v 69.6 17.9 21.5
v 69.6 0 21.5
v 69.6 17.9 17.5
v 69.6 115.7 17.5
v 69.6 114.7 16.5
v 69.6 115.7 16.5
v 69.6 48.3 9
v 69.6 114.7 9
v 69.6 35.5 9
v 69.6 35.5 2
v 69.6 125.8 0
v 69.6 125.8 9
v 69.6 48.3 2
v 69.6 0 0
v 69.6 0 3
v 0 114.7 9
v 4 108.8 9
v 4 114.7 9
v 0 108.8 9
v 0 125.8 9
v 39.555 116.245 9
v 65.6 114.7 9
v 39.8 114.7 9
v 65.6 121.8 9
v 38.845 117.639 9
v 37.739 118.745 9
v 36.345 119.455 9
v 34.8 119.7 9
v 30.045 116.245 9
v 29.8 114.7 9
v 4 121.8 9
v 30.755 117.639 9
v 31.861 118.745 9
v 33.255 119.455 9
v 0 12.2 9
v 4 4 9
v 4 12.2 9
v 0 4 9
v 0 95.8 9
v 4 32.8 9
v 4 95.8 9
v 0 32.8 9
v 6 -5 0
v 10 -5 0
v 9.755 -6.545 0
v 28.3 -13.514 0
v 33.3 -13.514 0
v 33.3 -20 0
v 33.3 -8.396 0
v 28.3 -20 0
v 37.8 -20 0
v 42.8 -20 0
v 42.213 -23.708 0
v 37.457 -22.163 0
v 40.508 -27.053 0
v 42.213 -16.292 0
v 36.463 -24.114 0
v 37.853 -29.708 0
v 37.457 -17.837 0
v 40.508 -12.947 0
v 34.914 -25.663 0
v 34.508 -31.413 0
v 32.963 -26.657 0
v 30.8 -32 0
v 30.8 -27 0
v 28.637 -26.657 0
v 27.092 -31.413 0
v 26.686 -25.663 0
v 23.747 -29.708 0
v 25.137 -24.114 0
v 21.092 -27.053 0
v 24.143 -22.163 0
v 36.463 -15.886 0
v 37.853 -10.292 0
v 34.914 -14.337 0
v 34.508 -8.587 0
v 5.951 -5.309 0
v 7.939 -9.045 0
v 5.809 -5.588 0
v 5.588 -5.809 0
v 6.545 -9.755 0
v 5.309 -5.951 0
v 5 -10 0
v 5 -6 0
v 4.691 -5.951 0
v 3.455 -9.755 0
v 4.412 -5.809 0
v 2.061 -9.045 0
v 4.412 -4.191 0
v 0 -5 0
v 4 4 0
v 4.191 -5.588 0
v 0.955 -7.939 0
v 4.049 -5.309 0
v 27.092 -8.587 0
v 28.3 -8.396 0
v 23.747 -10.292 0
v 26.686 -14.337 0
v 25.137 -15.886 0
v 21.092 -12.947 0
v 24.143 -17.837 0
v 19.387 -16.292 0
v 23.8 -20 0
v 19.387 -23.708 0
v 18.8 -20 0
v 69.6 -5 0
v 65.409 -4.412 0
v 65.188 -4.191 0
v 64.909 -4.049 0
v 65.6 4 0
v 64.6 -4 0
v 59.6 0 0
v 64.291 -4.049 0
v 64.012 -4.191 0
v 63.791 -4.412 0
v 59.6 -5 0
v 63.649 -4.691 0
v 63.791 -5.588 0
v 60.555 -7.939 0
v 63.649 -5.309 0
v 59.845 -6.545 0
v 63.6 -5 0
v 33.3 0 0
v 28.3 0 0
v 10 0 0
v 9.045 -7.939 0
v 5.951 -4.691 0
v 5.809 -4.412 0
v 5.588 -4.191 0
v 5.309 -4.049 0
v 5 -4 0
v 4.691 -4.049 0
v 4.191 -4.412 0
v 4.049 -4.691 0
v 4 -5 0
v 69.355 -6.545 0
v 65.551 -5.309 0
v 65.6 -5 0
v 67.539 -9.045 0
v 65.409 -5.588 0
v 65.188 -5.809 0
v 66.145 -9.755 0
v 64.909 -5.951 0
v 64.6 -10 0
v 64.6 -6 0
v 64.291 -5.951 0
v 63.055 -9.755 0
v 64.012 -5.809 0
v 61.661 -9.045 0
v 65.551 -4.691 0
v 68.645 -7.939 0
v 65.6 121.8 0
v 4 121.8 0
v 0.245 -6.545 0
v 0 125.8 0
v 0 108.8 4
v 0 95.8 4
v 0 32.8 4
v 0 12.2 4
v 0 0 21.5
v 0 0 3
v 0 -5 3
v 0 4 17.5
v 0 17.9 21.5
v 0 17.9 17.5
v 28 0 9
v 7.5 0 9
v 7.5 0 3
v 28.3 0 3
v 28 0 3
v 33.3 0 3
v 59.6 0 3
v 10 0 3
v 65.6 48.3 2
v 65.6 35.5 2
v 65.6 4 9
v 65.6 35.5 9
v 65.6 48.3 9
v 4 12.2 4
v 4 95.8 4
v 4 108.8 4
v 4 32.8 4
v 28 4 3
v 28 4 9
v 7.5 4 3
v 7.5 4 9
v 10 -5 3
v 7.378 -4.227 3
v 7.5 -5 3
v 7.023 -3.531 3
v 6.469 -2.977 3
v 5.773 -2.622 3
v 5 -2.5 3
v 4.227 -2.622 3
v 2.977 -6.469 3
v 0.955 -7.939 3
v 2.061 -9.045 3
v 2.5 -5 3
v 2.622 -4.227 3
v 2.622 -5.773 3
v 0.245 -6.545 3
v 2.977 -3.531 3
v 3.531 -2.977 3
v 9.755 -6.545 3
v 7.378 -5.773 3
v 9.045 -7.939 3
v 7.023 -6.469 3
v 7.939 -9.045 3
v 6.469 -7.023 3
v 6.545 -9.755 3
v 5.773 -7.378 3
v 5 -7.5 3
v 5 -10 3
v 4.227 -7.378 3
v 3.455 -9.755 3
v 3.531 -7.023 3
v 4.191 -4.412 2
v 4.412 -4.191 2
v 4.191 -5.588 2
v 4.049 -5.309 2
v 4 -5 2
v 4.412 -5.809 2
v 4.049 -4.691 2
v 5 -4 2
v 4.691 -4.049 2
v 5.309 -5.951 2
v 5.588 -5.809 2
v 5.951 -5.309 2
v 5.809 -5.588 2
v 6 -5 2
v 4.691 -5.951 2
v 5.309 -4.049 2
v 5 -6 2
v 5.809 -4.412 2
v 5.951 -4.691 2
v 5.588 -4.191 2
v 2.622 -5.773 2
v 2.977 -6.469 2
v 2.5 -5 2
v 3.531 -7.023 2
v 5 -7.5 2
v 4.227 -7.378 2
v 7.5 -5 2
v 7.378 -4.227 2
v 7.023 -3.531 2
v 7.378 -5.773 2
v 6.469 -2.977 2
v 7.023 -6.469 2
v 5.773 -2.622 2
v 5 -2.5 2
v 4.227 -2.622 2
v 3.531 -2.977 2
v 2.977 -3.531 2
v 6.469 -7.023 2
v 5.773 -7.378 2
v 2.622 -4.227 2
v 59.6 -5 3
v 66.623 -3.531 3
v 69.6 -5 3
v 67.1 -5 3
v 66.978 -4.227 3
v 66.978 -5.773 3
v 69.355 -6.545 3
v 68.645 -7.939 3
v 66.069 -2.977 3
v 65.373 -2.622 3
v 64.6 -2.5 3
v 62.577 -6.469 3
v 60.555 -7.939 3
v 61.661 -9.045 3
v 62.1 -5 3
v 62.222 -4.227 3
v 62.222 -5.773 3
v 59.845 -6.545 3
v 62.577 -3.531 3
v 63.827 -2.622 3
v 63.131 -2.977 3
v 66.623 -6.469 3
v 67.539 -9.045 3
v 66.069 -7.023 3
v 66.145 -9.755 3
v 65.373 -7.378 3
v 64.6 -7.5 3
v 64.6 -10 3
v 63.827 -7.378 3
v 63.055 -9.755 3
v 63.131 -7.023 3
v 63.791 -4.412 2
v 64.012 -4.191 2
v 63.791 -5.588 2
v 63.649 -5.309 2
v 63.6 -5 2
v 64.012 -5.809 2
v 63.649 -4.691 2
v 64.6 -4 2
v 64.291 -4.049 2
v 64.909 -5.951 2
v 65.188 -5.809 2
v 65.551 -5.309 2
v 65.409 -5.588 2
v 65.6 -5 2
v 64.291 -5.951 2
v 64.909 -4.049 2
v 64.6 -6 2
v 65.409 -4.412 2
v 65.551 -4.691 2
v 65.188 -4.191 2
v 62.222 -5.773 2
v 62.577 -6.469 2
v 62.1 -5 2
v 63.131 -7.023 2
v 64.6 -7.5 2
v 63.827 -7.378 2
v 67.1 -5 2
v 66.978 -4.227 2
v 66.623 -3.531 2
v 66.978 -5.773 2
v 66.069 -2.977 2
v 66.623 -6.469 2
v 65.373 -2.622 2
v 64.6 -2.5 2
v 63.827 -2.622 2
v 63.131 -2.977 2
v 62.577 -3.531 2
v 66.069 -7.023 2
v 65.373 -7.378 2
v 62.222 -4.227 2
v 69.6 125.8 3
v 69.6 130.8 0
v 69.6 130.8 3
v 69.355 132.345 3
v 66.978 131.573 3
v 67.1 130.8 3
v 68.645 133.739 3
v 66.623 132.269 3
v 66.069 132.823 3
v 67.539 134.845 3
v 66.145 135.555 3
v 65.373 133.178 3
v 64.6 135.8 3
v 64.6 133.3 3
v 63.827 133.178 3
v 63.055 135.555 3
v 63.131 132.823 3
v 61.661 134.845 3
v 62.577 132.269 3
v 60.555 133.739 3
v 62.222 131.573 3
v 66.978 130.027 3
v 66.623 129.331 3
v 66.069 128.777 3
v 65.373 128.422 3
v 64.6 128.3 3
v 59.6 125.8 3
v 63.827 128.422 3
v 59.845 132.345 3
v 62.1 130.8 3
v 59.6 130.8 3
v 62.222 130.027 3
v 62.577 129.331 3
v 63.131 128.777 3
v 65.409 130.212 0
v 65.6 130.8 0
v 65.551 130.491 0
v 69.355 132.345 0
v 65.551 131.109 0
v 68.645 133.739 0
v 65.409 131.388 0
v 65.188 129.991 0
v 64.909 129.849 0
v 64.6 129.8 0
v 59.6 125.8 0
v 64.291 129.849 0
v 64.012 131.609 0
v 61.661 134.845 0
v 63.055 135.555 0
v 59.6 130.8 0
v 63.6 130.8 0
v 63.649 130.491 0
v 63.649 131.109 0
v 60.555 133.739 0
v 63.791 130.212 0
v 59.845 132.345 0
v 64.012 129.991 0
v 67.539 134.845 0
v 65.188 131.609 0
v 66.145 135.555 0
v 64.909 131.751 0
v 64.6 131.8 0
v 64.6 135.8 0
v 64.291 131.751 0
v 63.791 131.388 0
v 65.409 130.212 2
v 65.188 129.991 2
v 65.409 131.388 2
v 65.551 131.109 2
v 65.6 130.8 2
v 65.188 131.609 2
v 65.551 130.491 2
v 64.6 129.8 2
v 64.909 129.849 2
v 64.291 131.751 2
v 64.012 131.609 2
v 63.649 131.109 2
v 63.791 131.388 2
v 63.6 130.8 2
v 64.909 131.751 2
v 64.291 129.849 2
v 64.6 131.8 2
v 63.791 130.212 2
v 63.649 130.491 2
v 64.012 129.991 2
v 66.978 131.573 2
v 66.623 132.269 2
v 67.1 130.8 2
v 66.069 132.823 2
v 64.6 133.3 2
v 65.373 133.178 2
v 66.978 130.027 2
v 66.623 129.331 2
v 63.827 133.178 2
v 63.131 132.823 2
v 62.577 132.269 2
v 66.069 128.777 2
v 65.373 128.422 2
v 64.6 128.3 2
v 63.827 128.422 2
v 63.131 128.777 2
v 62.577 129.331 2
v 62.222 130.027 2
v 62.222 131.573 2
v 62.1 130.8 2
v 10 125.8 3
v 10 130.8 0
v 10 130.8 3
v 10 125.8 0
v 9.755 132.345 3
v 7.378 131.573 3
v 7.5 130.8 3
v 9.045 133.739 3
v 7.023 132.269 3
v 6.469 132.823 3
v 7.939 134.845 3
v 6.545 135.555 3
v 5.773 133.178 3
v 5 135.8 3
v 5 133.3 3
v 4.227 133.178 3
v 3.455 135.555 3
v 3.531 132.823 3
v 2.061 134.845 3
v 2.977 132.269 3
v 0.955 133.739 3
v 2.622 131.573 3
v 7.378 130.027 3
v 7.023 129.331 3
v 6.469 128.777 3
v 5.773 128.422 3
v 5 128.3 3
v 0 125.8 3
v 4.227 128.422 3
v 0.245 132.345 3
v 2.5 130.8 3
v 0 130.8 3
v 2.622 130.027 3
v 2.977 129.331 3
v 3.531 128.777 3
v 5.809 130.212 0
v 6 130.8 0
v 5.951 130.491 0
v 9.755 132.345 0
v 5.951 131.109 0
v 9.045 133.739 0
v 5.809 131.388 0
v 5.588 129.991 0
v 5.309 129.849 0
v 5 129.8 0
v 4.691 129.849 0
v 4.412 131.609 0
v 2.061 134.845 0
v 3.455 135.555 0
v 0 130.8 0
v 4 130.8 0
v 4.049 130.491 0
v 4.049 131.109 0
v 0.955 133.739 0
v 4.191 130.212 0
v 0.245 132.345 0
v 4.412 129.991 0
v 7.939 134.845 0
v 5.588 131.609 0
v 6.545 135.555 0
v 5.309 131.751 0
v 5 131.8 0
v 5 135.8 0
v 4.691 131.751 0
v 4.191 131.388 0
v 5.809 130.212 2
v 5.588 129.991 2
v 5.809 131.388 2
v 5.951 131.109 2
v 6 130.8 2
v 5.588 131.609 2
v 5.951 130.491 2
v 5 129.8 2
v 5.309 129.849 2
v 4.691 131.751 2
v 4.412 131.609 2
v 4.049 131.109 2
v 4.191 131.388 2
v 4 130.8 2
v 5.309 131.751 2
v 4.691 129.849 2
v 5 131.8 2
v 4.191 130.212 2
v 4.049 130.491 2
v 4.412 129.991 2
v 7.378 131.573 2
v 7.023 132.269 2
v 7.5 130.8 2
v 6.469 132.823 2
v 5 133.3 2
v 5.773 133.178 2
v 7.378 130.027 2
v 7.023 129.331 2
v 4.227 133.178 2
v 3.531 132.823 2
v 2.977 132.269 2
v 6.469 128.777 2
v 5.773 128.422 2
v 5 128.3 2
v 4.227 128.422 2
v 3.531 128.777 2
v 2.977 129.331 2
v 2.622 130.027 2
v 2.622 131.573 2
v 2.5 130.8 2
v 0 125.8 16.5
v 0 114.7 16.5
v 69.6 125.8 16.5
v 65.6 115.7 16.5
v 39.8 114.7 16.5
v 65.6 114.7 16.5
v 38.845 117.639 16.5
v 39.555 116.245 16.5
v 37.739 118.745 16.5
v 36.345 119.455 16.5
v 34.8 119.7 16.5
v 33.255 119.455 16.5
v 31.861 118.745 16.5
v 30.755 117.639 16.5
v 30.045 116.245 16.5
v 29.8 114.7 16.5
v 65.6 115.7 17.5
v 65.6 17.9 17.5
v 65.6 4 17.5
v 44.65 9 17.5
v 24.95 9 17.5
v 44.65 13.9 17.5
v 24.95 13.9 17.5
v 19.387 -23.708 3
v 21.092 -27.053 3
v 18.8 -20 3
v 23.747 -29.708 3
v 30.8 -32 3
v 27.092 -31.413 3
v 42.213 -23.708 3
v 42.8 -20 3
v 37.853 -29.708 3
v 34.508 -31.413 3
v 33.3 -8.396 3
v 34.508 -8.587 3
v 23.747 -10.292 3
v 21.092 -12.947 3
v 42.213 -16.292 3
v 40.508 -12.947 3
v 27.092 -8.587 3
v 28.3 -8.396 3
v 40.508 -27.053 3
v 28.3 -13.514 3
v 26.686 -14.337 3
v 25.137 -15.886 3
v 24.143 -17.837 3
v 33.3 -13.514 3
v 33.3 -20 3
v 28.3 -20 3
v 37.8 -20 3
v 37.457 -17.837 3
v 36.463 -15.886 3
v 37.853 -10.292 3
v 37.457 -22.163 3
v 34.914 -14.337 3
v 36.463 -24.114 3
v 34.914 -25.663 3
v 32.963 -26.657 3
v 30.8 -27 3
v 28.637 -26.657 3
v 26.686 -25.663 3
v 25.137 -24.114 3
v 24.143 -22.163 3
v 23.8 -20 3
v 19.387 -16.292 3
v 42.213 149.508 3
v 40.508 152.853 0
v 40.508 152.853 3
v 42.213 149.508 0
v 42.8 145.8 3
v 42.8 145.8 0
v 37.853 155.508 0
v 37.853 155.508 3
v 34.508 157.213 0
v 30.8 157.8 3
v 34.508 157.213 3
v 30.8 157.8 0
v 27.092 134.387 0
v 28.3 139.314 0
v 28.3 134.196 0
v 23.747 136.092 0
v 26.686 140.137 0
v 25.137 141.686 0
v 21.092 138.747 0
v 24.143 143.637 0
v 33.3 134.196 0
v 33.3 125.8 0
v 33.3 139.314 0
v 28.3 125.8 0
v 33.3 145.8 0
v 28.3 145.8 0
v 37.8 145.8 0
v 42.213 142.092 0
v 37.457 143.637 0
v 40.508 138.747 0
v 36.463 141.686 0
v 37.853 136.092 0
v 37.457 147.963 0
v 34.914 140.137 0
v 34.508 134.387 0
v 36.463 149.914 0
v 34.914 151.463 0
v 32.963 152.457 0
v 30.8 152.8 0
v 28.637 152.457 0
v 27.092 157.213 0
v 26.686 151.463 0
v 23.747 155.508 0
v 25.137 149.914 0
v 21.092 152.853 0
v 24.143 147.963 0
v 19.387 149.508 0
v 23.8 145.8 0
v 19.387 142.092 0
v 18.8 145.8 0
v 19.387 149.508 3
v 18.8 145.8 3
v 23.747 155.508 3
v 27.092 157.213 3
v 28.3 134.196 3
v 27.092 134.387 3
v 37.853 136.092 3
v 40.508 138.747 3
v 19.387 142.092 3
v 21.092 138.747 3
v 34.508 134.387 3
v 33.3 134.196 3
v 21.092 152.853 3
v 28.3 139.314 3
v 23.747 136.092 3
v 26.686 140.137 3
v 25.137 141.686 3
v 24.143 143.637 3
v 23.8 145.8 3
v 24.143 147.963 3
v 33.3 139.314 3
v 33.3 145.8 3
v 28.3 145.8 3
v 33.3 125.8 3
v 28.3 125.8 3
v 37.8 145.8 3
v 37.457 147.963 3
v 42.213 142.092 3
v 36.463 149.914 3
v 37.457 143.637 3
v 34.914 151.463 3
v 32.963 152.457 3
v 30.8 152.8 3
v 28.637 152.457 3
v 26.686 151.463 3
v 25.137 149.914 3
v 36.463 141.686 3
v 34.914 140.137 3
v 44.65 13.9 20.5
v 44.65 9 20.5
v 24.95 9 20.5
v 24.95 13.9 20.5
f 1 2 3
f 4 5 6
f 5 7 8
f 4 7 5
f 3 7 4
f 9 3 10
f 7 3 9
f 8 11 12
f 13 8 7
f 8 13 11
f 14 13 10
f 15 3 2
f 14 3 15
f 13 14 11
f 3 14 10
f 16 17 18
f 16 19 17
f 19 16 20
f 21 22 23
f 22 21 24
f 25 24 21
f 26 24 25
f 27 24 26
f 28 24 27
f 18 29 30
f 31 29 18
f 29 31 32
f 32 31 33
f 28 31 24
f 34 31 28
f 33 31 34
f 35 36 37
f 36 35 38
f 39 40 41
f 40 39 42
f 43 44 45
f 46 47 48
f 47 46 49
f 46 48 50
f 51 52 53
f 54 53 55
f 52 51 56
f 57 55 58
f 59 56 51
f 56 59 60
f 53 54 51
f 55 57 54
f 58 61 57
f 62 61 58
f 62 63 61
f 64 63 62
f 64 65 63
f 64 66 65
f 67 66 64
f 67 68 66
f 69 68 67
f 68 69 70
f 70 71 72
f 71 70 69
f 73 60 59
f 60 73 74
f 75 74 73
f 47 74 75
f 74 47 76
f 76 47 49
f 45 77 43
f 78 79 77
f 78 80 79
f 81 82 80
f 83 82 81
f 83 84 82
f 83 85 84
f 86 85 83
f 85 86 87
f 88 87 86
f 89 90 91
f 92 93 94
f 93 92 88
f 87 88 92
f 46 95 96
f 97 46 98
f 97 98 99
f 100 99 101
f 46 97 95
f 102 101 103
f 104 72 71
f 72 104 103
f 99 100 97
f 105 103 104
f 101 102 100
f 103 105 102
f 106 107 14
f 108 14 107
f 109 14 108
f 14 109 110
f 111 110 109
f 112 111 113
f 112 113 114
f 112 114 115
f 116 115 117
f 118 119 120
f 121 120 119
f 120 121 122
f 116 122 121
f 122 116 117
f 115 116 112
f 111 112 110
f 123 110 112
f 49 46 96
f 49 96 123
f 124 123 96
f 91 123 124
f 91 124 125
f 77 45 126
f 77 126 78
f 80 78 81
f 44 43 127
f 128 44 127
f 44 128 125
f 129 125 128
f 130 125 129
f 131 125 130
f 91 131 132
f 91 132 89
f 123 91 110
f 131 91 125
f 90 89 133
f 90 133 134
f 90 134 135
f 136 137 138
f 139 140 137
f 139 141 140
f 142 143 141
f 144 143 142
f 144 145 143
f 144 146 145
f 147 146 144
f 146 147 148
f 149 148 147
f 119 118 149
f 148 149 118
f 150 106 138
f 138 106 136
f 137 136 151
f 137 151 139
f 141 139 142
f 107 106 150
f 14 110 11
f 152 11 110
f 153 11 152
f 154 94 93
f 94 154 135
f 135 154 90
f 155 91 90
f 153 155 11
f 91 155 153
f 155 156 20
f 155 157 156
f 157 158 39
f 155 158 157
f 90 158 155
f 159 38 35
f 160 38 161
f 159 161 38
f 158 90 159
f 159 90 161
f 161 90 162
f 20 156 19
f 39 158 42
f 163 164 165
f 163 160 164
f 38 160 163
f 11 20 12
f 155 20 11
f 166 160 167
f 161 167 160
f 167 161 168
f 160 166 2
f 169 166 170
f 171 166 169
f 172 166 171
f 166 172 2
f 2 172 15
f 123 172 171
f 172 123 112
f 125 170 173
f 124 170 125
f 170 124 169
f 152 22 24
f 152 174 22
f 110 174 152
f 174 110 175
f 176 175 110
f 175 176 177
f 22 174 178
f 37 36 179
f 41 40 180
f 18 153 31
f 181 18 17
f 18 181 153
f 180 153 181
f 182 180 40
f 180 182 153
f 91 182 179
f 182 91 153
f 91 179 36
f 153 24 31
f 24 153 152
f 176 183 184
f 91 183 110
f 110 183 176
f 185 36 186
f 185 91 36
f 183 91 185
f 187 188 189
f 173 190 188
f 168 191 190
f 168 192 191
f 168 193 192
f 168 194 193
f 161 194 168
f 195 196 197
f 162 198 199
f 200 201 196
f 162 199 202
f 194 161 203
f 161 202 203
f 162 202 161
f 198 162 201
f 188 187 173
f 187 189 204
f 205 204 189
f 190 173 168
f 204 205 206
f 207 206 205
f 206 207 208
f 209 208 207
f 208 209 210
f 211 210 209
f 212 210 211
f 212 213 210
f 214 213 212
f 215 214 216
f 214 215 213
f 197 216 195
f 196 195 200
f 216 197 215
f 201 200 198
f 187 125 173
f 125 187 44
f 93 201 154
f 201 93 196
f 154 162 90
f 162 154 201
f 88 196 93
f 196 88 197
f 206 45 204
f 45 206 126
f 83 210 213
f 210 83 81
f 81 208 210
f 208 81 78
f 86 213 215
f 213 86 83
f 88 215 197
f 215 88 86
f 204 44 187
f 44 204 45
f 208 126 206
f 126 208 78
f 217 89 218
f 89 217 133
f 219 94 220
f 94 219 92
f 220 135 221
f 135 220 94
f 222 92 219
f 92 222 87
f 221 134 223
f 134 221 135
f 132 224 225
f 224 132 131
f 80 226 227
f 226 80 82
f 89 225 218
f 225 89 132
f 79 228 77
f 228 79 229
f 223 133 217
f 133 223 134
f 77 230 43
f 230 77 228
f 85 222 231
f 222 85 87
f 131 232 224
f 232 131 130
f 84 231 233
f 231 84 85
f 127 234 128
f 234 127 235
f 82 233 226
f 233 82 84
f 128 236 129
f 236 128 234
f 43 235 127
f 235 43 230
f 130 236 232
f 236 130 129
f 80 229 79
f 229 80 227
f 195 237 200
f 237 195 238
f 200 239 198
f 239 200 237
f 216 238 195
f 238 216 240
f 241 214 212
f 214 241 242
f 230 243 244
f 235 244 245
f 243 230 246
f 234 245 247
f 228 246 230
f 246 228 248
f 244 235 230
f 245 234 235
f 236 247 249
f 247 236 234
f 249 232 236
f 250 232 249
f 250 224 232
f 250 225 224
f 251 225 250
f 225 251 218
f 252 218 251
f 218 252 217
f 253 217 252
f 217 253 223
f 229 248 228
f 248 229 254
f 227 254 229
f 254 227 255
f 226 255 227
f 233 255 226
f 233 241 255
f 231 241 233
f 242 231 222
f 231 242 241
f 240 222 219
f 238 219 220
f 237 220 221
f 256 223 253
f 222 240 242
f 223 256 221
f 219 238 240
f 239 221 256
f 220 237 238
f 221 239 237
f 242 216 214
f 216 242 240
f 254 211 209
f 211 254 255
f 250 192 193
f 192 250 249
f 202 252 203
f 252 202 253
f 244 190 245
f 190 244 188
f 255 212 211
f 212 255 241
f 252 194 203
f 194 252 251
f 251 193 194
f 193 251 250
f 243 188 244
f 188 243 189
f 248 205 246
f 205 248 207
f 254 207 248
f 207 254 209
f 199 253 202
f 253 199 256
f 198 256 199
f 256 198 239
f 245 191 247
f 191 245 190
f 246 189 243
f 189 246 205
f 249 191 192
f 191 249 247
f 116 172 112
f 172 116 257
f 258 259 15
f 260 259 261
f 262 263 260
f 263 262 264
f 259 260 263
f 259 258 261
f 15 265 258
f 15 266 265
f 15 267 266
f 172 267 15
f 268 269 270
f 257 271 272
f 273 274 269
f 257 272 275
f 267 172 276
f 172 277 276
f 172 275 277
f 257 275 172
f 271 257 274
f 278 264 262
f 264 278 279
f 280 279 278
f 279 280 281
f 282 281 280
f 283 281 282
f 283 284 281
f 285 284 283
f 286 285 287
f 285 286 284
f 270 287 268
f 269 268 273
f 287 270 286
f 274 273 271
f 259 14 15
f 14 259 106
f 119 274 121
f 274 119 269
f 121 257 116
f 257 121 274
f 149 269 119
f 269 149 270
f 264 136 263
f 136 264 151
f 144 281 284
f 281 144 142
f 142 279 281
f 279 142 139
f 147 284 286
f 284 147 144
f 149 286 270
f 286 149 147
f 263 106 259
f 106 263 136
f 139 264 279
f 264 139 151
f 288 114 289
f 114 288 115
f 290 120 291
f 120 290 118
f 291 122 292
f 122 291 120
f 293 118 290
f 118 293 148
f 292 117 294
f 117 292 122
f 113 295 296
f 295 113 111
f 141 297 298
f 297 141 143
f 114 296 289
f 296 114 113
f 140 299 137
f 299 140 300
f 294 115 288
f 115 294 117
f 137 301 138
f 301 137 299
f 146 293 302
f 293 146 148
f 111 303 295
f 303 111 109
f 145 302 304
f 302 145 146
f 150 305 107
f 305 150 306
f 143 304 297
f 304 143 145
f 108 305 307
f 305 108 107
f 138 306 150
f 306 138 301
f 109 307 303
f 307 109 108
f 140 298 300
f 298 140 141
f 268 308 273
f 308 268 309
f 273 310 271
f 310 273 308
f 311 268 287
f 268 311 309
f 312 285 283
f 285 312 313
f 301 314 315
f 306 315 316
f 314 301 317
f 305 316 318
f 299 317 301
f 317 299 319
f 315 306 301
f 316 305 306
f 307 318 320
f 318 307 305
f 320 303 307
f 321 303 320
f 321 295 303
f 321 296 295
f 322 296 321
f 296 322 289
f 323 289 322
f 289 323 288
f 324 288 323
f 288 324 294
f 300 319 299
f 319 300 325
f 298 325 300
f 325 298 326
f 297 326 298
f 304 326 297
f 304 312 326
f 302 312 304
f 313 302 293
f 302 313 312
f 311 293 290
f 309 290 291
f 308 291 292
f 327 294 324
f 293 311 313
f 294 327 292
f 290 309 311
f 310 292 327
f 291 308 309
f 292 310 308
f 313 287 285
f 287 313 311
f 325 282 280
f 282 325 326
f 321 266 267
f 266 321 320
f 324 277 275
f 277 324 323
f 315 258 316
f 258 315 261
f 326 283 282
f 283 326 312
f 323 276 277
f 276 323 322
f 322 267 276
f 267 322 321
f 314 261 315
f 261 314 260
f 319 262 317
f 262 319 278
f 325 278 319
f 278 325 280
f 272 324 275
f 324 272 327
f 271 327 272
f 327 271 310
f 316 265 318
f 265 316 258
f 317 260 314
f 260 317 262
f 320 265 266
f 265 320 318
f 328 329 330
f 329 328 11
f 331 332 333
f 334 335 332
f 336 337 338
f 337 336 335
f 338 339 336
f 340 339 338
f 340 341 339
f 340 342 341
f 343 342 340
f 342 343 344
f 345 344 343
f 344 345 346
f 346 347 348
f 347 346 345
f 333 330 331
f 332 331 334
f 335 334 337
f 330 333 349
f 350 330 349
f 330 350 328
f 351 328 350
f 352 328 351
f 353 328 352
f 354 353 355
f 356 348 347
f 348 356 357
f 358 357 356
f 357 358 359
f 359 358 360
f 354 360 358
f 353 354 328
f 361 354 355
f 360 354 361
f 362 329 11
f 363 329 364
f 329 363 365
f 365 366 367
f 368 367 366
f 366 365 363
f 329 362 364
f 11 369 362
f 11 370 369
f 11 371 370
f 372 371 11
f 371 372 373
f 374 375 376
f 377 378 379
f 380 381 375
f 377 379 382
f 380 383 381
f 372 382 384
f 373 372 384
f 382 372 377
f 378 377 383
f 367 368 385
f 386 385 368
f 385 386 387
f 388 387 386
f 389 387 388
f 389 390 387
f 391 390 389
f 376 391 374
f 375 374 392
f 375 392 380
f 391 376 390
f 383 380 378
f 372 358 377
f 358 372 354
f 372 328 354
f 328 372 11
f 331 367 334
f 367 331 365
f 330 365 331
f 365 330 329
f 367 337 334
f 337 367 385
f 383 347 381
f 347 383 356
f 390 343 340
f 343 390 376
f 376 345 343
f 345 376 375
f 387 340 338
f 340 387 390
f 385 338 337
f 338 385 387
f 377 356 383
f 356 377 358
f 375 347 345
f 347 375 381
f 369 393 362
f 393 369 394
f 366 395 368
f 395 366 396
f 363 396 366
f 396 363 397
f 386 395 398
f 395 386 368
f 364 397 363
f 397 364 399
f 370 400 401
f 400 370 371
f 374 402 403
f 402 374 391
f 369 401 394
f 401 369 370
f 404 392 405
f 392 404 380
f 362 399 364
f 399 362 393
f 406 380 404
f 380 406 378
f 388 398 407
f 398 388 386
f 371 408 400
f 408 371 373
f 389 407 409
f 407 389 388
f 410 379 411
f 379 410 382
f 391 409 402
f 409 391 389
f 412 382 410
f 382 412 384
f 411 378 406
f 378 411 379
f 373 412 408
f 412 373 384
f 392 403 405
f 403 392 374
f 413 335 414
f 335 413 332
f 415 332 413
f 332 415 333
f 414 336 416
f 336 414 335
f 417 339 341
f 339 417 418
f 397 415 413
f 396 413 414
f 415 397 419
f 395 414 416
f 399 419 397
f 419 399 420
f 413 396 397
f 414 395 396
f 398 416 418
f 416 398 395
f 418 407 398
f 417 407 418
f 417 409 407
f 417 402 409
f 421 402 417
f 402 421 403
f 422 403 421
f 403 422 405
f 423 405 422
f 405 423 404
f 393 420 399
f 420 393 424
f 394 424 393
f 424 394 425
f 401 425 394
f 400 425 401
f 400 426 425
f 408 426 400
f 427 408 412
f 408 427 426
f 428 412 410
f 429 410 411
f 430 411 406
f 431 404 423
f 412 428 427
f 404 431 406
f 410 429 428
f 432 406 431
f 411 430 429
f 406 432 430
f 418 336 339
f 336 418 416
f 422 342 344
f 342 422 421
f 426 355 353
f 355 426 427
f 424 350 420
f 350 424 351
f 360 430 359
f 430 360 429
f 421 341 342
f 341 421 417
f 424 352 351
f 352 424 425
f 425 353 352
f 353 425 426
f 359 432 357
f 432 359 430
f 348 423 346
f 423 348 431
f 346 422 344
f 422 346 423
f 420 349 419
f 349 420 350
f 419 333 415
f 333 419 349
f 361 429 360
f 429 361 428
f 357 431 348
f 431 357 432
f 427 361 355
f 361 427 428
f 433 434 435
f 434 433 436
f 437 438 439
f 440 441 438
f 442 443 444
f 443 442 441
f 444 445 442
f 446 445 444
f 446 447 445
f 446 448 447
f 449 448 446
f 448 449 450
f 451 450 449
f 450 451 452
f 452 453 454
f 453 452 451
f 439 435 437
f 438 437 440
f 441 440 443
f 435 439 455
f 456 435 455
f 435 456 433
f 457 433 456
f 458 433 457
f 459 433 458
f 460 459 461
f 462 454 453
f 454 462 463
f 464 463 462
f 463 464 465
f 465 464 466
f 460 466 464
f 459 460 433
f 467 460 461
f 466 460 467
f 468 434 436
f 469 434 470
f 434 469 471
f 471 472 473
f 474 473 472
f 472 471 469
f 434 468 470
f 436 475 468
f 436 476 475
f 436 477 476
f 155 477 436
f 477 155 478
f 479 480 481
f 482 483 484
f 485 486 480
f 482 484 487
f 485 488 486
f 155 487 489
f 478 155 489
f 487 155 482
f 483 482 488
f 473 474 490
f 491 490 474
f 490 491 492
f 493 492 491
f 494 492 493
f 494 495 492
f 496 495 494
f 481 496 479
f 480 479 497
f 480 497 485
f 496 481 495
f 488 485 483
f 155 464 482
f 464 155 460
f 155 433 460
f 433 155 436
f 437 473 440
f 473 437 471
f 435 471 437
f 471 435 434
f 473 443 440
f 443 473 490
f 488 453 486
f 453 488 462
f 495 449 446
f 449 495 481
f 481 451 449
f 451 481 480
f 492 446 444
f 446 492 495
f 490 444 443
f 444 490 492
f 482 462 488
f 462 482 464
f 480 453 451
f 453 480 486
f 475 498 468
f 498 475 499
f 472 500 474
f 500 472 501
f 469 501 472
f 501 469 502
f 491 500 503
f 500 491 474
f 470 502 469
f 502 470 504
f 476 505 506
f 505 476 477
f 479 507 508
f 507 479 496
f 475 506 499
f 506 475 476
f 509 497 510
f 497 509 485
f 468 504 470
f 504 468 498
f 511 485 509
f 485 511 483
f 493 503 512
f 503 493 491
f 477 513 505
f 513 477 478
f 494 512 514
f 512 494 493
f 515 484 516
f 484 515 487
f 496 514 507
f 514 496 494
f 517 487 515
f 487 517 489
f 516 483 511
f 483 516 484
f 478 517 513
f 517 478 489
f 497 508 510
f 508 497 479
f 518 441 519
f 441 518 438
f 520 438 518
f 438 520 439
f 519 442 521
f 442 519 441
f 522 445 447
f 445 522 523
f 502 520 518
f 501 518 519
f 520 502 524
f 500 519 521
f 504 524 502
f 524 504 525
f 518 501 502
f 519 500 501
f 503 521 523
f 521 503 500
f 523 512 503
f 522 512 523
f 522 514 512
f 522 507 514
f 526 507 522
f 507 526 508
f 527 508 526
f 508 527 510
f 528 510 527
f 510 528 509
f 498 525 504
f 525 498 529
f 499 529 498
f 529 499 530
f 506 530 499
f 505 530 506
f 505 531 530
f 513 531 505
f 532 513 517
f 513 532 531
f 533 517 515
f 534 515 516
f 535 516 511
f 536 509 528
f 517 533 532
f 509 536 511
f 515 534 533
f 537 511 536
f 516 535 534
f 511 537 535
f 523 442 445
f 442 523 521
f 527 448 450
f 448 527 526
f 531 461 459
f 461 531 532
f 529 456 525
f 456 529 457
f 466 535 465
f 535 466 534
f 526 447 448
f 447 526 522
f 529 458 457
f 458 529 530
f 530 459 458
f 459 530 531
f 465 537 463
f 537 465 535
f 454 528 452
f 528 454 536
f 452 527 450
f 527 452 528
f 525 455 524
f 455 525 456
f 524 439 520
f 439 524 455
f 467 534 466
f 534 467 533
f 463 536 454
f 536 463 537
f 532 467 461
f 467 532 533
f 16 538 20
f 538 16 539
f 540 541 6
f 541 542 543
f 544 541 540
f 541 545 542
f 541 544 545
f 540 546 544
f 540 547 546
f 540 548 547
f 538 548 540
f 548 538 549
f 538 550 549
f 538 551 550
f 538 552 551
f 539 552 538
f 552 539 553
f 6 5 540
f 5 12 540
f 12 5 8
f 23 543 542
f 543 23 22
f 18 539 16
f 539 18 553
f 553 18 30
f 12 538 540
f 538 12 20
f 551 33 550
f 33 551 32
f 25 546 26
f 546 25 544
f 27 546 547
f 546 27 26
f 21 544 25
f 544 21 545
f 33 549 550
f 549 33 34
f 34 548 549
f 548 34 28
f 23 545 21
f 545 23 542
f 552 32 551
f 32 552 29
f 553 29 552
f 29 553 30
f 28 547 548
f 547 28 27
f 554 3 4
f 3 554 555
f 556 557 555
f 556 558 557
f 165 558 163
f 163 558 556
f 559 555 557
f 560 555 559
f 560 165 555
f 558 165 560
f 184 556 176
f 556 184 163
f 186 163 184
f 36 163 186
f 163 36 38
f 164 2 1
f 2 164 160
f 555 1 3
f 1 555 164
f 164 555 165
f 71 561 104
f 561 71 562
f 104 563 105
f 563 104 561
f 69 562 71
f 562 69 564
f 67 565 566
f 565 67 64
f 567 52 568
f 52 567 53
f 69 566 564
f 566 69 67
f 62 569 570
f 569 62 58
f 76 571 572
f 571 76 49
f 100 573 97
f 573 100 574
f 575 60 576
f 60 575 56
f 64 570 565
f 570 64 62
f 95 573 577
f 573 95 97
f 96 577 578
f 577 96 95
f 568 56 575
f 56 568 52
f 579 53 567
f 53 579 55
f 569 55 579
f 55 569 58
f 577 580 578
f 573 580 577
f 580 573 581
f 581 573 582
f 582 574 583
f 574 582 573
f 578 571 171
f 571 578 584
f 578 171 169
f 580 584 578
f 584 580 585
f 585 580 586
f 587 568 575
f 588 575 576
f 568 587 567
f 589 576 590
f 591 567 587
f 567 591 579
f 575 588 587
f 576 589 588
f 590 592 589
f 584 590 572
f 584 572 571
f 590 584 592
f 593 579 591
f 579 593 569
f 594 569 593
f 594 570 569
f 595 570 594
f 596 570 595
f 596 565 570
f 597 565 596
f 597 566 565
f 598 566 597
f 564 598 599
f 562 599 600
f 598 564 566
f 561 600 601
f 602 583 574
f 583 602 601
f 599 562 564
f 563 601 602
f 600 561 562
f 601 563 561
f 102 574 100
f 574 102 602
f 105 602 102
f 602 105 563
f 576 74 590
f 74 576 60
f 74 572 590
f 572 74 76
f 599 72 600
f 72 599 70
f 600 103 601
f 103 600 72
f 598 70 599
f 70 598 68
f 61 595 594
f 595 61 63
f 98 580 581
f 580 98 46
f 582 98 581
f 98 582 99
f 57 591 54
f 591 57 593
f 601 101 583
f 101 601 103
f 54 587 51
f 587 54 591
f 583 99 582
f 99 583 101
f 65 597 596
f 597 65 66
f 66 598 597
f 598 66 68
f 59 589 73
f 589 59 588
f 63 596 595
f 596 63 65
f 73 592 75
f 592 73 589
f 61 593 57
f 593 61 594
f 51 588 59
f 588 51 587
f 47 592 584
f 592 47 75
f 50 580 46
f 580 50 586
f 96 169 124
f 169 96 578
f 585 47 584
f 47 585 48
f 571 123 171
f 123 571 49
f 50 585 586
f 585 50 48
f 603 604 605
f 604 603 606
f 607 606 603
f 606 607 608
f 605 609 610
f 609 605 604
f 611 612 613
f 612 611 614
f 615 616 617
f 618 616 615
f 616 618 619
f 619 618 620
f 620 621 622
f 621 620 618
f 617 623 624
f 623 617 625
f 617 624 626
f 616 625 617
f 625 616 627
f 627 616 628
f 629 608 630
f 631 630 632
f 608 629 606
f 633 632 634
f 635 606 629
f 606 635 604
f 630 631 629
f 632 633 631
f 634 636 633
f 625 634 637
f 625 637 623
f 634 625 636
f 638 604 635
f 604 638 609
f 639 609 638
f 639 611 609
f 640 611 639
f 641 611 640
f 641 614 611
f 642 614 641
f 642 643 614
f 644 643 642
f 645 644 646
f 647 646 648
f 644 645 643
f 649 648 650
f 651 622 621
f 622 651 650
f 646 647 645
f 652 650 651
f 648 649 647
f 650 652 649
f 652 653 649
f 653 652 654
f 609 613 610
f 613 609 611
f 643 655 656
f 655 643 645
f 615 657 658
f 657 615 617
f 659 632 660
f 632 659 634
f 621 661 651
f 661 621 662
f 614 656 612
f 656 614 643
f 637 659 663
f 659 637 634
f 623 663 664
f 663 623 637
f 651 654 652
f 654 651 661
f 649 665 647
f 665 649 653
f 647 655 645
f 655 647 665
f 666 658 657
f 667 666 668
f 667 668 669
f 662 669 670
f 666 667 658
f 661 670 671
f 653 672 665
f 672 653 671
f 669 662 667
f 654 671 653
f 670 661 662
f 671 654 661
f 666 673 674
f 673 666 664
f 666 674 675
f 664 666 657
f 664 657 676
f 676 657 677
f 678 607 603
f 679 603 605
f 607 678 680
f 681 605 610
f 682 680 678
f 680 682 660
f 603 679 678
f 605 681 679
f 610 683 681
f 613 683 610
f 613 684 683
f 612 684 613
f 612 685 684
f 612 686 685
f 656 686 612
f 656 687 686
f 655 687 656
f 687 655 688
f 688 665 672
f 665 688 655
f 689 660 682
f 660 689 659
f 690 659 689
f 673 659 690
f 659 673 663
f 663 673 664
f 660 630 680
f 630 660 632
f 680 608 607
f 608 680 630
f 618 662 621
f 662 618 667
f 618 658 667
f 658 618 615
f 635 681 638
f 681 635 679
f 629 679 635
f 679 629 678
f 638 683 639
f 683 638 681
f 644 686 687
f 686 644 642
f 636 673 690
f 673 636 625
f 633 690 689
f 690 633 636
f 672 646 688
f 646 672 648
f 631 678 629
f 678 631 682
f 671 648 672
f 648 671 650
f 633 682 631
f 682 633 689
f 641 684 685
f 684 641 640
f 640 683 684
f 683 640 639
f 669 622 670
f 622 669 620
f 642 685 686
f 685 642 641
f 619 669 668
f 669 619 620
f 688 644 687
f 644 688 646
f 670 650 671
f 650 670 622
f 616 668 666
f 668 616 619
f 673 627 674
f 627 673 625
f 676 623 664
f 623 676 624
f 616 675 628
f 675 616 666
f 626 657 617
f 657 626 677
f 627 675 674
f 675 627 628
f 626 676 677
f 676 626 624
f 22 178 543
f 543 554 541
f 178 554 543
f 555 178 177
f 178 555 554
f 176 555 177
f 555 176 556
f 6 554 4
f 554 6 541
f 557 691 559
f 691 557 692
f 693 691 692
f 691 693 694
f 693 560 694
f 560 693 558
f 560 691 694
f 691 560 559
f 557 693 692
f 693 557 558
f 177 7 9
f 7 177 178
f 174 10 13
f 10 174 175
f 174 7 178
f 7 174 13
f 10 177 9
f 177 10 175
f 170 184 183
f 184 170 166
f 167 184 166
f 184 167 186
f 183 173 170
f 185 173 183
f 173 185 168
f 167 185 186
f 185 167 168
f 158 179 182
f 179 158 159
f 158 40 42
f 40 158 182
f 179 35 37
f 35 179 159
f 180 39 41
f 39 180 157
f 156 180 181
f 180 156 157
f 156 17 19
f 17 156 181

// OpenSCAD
// file: params.scad
$fn = 20;

very_long = 500;
short_length = 1;
free_space = 1;

// phone
phone_width = 59.6 + free_space * 2;
phone_height = 115.8 + free_space * 2;
phone_bottom_thickness = 9.0;
phone_total_thickness = 14.5 + free_space * 2;
phone_top_thickness = phone_total_thickness - phone_bottom_thickness + free_space;
phone_speaker_width = 19.7;
phone_speaker_to_edge = 9.0;
phone_screen_bottom_to_edge = 7.1;
phone_screen_top_to_edge = 13.9;
phone_left_top_to_edge = 5.6;
phone_right_top_to_edge = 6.6;
phone_screen_length = phone_height - phone_screen_bottom_to_edge + free_space;
phone_usb_to_top = 31.5;
phone_usb_to_back = 2;
phone_usb_width = 12.8;
phone_usb_height = phone_bottom_thickness - phone_usb_to_back;
phone_mic_radius = 5;
phone_power_to_right = 3.5;
phone_power_width = 20.5;
phone_volume_button_to_bottom = 4;
phone_volume_button_to_edge = 12.2;
phone_volume_button_width = 20.6;
phone_camera_button_to_bottom = phone_volume_button_to_bottom;
phone_camera_button_to_edge = 17;
phone_camera_button_width = 13;
phone_camera_center_to_left = 10.4;
phone_camera_center_to_top = 16.8;
phone_camera_radius = 5.3;

// connector
connector_thickness = 3.0;
connector_radius = 5.0;

// shield
shield_common_thickness = 4.0;
shield_bottom_inner_edge = 12;

// screw
screw_diameter = 2.0;
screw_depth = 2.0;
screw_cap_diameter = 5.0;

// belt
belt_connector_width = 8;
belt_connector_length = 30;
belt_connector_thickness = 5;
belt_hole_length = 20;
belt_hole_thickness = 2.5;
belt_connector_from_edge = 5;
belt_round_radius = 1.5;
// file: common.scad
include <params.scad>;

module connector(){
	difference(){
		union(){
			translate([-connector_radius, 0, 0]){
				cube([connector_radius * 2, connector_radius, connector_thickness]);
			};
			translate([0, connector_radius, 0]){
				cylinder(connector_thickness, connector_radius, connector_radius);
			}
		};
		translate([0, connector_radius, 0])union(){
			cylinder(connector_thickness, screw_diameter / 2, screw_diameter / 2);
			translate([0, 0, screw_depth]){
				cylinder(connector_thickness - screw_depth, screw_cap_diameter / 2, screw_cap_diameter / 2);
			}
		};
	}
}

module connector2(width){
	for(t = [
		[connector_radius, 0, 0],
		[width - connector_radius, 0, 0]
	]){
		translate(t)
			rotate([0, 0, 180])
				connector();
	}
}

module connector4(width, height){
	connector2(width);
	translate([width, height, 0])
		rotate([0, 0, 180])
			connector2(width);
}

module put_rotated_2(){
	for(i = [0:$children-1])
		child(i);
	rotate([0, 0, 180])
		for(i = [0:$children-1])
			child(i);
}

module drop(width, height, depth){
	translate([width / 2, height / 2, 0])
		rotate([180, 180, 180])
			cube([width, height, depth]);
}

module pile(ratio=1){
	stick_length = 20 * ratio;
	ring_radius = 12 * ratio;
	ring_width = 5 * ratio;
	stick_width = 5 * ratio;
	thickness = 3;
	union(){
		translate([-stick_width/2, 0, 0])
			cube([stick_width, stick_length, thickness]);
		translate([0, stick_length, 0])
			difference(){
				cylinder(thickness, ring_radius, ring_radius);
				cylinder(thickness, ring_radius - ring_width, ring_radius - ring_width);
			}
	}
}
// main file
include <common.scad>;

upper_part_width = phone_width + shield_common_thickness * 2;
upper_part_height = phone_height + shield_common_thickness * 2;

difference(){
	union(){
		difference(){
			cube([upper_part_width, upper_part_height, phone_bottom_thickness]);
			translate([shield_common_thickness, shield_common_thickness, 0])
				cube([phone_width, phone_height, phone_bottom_thickness]);
		}
		connector4(upper_part_width, upper_part_height);

		translate([upper_part_width, upper_part_height, phone_bottom_thickness])
			rotate([0, 0, 180])
				difference(){
					cube([upper_part_width, shield_common_thickness + phone_screen_bottom_to_edge, max(shield_common_thickness, phone_total_thickness - phone_bottom_thickness)]);
					translate([upper_part_width / 2, shield_common_thickness + phone_screen_bottom_to_edge, 0]){
						cylinder(very_long, phone_mic_radius, phone_mic_radius);
					}
				}

		translate([0, 0, phone_bottom_thickness]){
			cube([upper_part_width, shield_common_thickness, phone_top_thickness]);
			translate([0, 0, phone_top_thickness])
				cube([upper_part_width, shield_common_thickness + phone_screen_top_to_edge, shield_common_thickness]);
		}

		translate([upper_part_width, 0, phone_bottom_thickness])
			rotate([0, 0, 90])
				cube([shield_common_thickness + phone_screen_length, shield_common_thickness, phone_top_thickness]);
		translate([phone_width / 2, 0, 0])
			rotate([0, 0, 180])
				pile();
		translate([phone_width / 2, phone_height + shield_common_thickness * 2, 0])
			pile();
	}
	translate([upper_part_width / 2 - phone_speaker_width / 2, phone_speaker_to_edge,  phone_total_thickness])
		cube([phone_speaker_width, phone_screen_top_to_edge - phone_speaker_to_edge, shield_common_thickness]);
	translate([upper_part_width - shield_common_thickness, phone_usb_to_top + shield_common_thickness, phone_usb_to_back])
		cube([shield_common_thickness, phone_usb_width, phone_usb_height]);
	translate([shield_common_thickness + phone_power_to_right, 0, connector_thickness])
		cube([phone_power_width, shield_common_thickness, phone_bottom_thickness - connector_thickness]);
	translate([0, phone_volume_button_to_edge, phone_volume_button_to_bottom])
		cube([shield_common_thickness, phone_volume_button_width, phone_bottom_thickness - phone_volume_button_to_bottom]);
	translate([0, upper_part_height, 0])
		rotate([0, 0, 180])
			translate([0, phone_camera_button_to_edge, phone_camera_button_to_bottom])
				rotate([0, 0, 90])
					cube([phone_camera_button_width, shield_common_thickness + short_length, phone_bottom_thickness - phone_camera_button_to_bottom]);
}
